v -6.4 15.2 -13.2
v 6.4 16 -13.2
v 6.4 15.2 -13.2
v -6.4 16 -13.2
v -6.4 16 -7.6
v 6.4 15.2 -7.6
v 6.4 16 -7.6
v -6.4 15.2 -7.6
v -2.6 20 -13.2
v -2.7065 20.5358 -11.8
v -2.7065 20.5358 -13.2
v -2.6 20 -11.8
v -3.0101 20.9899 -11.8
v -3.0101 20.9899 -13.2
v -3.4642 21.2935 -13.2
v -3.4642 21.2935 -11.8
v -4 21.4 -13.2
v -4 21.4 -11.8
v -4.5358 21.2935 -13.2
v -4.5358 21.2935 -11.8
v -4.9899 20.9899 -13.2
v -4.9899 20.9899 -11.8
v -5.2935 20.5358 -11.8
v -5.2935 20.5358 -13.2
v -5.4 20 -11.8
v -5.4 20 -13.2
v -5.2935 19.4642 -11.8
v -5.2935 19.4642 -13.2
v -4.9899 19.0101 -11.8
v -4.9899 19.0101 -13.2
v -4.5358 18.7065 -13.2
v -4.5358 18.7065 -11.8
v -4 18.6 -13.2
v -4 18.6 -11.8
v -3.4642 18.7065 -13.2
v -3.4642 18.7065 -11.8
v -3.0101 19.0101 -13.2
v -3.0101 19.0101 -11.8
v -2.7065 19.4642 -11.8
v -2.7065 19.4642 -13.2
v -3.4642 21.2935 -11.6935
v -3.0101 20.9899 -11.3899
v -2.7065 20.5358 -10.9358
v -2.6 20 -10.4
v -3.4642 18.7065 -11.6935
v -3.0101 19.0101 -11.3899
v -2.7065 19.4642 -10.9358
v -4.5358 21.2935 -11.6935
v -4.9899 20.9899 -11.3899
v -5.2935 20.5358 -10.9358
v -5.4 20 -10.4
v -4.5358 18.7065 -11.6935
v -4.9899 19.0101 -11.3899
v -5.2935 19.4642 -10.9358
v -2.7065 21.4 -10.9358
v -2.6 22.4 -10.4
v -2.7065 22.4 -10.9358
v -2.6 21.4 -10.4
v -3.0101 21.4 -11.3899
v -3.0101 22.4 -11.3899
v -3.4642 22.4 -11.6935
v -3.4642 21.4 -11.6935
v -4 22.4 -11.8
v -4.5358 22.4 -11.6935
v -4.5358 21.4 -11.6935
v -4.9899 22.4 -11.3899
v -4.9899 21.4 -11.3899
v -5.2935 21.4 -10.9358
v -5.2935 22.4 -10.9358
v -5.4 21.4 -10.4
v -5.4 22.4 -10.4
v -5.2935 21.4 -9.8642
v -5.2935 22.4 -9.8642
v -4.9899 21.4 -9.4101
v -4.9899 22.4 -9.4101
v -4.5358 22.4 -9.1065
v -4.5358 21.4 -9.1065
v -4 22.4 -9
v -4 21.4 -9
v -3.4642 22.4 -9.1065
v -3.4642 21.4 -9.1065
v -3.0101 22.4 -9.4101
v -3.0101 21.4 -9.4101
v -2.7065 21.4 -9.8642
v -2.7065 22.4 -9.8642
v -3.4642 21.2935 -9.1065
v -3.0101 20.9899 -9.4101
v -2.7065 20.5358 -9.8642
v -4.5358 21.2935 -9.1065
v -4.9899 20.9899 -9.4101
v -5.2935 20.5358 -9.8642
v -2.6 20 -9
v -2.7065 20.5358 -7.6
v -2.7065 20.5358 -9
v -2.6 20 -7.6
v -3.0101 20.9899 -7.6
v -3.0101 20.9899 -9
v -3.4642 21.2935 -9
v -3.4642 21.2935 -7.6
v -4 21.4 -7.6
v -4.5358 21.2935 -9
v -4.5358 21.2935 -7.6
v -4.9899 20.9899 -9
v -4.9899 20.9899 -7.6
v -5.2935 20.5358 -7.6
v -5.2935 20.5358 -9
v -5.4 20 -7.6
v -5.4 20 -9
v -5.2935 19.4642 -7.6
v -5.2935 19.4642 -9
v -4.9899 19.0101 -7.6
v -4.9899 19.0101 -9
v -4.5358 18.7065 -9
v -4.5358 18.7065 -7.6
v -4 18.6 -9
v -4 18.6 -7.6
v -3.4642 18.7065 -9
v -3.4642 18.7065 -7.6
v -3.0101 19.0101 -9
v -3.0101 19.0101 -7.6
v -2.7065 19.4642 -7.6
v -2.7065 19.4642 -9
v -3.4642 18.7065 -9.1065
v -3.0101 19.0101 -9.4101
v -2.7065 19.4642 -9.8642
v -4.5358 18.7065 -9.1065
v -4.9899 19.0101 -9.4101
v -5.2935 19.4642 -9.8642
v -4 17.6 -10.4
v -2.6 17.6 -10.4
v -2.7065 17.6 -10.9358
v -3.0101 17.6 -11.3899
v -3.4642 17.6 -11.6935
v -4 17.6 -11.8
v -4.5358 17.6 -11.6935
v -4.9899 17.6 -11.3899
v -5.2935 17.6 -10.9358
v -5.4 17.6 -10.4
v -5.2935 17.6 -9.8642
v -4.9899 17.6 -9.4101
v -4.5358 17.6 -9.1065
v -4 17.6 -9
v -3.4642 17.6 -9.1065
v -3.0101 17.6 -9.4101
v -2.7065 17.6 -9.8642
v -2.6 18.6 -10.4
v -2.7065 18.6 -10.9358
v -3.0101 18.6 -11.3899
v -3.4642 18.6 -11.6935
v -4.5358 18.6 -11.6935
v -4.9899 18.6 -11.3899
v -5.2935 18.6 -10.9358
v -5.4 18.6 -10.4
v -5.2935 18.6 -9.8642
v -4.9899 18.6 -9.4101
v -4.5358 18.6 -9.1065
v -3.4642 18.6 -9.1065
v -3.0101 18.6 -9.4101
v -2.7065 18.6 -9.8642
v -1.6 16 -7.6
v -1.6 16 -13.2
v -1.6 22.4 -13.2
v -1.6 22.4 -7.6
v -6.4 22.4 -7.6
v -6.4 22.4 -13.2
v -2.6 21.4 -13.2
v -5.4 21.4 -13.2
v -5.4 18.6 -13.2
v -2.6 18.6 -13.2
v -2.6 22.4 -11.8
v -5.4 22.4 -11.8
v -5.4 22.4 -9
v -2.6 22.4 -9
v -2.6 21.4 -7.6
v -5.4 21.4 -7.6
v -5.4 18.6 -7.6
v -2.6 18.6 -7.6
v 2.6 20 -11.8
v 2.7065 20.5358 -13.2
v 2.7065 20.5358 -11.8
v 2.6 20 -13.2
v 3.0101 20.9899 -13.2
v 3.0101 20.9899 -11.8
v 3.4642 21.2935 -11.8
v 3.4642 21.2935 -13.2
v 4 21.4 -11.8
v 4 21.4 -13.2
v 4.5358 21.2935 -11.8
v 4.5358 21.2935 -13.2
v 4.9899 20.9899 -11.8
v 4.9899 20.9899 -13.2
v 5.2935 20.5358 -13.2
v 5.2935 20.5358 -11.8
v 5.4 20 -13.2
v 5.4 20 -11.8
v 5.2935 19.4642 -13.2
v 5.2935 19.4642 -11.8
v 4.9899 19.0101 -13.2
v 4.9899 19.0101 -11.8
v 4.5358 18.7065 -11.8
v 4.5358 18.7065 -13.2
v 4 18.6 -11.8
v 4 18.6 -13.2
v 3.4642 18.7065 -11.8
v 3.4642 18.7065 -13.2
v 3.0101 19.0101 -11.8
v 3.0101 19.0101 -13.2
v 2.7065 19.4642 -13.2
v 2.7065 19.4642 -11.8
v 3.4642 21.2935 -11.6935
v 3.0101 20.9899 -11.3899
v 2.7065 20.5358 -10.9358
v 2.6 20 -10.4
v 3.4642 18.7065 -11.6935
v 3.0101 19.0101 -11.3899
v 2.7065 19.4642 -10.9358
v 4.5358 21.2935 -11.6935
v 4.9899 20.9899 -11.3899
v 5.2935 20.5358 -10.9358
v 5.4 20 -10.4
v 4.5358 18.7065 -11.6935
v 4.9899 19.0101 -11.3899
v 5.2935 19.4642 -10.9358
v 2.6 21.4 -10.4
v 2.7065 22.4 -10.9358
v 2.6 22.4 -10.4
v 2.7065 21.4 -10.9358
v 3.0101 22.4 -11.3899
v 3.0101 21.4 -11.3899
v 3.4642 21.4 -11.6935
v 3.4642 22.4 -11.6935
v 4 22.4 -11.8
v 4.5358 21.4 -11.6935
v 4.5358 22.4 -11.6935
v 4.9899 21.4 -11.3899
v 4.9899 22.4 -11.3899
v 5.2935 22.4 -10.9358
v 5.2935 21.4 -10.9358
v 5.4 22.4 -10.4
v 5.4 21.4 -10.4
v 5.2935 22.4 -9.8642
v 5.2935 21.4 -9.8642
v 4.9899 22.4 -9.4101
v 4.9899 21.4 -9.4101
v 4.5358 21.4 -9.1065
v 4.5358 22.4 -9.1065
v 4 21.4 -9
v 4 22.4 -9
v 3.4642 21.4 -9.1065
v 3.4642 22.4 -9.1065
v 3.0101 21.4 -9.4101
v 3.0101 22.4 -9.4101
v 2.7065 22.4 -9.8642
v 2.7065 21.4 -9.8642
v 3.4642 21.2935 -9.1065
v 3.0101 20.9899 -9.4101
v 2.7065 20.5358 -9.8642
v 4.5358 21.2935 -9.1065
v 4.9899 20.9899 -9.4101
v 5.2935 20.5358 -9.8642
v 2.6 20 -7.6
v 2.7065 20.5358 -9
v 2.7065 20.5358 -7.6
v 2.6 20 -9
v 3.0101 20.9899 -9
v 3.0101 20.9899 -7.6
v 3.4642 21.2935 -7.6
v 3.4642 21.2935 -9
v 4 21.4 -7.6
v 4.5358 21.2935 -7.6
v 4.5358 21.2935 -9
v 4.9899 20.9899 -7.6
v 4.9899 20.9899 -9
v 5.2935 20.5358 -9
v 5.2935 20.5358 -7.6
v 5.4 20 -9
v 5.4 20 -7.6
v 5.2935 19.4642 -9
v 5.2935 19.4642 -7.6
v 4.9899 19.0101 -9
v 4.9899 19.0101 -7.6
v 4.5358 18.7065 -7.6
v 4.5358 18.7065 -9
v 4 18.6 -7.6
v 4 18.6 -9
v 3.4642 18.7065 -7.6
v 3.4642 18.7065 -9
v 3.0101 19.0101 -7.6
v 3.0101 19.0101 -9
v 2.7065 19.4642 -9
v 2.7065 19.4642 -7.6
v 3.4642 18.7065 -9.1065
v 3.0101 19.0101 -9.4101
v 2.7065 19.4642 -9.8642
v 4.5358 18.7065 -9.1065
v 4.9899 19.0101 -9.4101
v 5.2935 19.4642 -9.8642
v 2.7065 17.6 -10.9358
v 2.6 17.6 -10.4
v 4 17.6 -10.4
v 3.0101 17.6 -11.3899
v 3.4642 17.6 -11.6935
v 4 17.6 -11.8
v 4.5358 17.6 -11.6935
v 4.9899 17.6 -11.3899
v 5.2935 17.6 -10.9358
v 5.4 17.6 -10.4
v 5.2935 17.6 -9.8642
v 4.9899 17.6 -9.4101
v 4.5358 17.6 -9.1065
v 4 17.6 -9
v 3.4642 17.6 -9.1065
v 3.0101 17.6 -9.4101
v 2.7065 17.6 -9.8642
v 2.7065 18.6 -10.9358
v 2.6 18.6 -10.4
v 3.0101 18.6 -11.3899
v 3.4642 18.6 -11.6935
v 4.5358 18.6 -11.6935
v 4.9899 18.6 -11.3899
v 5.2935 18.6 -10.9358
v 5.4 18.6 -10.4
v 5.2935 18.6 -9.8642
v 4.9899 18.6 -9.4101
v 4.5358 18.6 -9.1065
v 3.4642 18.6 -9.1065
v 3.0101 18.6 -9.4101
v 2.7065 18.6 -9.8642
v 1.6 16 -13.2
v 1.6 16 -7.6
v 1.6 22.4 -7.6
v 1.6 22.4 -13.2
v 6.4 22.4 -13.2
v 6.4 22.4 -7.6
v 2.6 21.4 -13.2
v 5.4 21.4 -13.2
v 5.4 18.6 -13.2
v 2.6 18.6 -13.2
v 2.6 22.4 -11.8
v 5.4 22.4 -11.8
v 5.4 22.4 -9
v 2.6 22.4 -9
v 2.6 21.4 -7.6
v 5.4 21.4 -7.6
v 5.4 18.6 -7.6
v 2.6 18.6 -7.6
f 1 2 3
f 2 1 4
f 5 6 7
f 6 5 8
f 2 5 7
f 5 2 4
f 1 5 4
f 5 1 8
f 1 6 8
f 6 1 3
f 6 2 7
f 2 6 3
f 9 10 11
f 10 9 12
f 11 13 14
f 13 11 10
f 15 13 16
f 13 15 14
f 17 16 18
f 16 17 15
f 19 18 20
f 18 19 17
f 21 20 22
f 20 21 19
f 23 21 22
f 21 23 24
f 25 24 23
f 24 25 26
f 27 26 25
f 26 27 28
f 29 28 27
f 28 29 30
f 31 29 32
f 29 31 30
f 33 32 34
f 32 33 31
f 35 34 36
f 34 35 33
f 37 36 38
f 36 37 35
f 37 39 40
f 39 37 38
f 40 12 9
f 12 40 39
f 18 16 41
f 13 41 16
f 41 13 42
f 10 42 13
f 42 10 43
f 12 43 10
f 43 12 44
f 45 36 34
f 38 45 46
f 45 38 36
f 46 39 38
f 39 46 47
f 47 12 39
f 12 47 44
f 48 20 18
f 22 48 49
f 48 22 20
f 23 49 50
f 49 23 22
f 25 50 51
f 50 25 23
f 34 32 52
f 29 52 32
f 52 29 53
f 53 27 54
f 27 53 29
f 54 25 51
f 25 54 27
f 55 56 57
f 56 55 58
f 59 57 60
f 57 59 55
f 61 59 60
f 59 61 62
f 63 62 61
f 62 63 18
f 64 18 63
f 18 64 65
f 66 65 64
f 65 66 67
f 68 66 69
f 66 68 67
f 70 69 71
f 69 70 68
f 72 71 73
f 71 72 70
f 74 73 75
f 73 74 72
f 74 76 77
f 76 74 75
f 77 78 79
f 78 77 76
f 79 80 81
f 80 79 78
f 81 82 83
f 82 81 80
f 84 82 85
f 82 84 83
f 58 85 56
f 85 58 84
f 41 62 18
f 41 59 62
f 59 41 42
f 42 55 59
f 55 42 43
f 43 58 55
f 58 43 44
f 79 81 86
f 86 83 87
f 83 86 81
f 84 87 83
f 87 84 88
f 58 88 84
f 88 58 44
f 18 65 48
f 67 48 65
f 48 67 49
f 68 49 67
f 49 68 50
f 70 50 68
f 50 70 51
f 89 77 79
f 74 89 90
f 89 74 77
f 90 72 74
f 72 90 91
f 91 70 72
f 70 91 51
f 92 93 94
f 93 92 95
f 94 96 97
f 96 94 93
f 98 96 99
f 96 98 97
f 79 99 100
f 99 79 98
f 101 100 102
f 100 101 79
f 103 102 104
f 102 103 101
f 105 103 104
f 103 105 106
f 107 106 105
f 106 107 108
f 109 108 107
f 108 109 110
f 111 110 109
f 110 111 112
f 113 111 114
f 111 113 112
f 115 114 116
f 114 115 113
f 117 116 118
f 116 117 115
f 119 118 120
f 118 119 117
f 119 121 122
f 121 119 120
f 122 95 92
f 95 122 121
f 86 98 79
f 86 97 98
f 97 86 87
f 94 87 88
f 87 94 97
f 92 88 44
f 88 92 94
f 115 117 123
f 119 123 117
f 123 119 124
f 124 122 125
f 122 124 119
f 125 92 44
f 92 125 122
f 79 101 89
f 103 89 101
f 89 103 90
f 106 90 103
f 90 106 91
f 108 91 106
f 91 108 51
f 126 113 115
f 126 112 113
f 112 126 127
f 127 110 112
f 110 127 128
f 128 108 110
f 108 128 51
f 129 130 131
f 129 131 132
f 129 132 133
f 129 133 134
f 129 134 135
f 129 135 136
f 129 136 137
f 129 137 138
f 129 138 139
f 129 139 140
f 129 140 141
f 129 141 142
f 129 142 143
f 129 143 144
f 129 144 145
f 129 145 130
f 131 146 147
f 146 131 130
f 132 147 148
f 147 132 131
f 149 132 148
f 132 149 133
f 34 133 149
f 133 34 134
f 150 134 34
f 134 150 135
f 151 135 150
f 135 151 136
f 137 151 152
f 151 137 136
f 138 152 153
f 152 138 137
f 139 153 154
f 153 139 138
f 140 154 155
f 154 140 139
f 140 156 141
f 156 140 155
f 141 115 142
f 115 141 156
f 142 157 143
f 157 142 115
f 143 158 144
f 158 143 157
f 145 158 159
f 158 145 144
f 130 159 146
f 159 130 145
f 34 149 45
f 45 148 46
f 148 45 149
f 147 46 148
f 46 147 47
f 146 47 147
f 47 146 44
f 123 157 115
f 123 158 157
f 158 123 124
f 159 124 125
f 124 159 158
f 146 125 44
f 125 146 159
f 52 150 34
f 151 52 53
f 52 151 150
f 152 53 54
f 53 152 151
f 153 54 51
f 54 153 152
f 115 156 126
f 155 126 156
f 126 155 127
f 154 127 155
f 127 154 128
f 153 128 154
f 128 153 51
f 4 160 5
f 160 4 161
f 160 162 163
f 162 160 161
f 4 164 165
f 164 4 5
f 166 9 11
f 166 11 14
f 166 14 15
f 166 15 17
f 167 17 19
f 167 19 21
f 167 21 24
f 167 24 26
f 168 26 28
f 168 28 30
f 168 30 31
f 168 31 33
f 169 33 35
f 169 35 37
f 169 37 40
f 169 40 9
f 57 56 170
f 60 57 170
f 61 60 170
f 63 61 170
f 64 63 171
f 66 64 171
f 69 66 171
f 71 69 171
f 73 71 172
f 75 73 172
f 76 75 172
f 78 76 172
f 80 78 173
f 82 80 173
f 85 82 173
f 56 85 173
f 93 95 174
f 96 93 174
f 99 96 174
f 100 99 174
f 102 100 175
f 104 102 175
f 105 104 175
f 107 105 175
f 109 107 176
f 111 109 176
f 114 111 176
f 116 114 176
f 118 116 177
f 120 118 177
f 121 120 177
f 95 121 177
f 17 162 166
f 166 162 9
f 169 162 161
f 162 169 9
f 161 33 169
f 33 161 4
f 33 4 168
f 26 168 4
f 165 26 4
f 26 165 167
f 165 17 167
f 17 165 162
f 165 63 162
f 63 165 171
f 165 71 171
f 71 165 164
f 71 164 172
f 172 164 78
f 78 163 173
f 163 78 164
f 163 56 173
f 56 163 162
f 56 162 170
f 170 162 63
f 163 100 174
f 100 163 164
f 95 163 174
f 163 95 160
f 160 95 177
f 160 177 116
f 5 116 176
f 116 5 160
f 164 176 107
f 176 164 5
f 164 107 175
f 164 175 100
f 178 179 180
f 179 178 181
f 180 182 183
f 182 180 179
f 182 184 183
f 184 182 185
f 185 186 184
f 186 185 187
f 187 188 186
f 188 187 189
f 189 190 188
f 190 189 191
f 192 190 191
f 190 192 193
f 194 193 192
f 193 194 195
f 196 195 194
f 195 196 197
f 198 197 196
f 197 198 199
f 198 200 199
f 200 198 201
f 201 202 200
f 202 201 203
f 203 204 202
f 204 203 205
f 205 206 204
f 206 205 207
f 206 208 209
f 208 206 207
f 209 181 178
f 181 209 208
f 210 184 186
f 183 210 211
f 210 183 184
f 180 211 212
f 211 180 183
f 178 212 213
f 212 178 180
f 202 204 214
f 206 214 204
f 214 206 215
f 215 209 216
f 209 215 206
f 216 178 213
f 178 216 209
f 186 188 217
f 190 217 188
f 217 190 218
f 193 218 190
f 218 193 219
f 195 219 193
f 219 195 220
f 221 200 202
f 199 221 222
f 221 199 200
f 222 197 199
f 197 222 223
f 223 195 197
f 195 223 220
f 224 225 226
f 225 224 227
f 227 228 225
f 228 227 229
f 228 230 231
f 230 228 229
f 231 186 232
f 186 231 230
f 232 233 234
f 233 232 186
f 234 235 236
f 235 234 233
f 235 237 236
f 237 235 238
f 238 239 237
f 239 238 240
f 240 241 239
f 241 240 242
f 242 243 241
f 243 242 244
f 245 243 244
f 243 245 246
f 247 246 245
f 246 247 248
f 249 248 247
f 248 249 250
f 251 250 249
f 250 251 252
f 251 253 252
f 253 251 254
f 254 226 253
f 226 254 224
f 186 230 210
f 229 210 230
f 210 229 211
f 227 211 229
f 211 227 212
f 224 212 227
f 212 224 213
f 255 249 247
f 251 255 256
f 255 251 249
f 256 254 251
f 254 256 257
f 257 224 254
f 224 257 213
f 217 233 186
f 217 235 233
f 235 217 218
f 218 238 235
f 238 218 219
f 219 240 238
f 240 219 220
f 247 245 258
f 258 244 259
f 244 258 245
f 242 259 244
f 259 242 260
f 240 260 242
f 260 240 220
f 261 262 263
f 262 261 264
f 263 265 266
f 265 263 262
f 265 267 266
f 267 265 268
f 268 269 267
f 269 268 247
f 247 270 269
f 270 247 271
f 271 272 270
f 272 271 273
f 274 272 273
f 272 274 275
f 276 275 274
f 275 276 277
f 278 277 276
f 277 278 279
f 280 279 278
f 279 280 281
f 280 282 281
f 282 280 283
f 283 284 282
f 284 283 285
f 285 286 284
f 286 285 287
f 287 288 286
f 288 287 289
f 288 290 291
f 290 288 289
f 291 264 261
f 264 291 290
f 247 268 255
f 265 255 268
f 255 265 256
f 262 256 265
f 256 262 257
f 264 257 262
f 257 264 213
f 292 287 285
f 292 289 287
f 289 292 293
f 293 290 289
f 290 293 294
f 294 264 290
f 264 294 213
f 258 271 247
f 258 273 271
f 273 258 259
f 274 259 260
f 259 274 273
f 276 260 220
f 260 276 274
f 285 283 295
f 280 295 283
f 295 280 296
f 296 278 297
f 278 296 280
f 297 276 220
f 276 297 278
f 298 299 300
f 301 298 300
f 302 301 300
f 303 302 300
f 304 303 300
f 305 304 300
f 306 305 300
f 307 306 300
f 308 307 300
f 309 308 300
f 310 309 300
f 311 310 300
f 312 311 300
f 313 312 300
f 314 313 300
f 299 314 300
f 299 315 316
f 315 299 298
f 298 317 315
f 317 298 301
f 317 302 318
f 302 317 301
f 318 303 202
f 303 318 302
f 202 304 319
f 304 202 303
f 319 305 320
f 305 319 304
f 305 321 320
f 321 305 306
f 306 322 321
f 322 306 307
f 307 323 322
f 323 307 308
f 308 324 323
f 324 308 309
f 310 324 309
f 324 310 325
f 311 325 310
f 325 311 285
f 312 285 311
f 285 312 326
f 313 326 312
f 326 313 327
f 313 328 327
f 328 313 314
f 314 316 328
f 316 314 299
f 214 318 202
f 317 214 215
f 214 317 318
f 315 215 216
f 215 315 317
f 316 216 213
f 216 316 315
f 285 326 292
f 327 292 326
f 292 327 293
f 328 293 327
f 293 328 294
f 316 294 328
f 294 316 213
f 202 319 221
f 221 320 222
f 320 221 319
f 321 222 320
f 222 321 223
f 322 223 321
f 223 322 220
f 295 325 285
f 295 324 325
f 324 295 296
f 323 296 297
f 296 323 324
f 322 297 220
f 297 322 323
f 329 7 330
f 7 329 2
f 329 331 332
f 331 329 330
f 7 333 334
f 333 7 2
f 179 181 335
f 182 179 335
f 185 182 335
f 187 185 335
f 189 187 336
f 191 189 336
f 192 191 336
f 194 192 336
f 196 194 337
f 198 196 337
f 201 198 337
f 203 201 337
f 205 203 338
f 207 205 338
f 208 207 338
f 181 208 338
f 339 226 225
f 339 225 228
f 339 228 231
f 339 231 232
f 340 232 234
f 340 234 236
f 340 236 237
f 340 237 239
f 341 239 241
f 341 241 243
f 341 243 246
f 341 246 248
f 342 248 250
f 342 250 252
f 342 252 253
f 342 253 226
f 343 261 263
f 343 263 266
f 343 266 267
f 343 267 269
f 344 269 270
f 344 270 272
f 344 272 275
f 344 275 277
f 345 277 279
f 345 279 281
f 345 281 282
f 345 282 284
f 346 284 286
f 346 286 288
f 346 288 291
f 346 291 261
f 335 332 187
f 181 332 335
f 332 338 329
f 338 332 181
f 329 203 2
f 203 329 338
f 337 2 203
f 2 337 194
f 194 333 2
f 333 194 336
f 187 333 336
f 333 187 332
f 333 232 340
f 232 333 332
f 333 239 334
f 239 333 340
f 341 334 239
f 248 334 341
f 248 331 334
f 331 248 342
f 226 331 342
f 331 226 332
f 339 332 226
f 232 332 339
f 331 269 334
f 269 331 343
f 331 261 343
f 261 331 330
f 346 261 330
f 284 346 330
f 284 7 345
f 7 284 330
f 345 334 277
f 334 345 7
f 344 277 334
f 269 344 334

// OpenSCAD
// file: ../p/box3u2p.scad
use <../lib.scad>
function ldraw_lib__box3u2p() = [
// 0 Box with 3 Faces without 2 Parallel Edges
// 0 Name: box3u2p.dat
// 0 Author: Niels Karsdorp [nielsk]
// 0 !LDRAW_ORG Primitive UPDATE 2012-01
// 0 !LICENSE Licensed under CC BY 4.0 : see CAreadme.txt
// 
// 0 BFC CERTIFY CCW
  [0,"BFC","CERTIFY"],
  [0,"BFC","CCW"],
// 
// 0 !HISTORY 2003-03-12 [PTadmin] Official Update 2003-01
// 0 !HISTORY 2007-06-24 [PTadmin] Header formatted for Contributor Agreement
// 0 !HISTORY 2008-07-01 [PTadmin] Official Update 2008-01
// 0 !HISTORY 2012-02-16 [Philo] Changed to CCW
// 0 !HISTORY 2012-03-30 [PTadmin] Official Update 2012-01
// 
// 
// 2 24 1 1 1 -1 1 1
  [2,24,1,1,1,-1,1,1],
// 2 24 -1 1 -1 1 1 -1
  [2,24,-1,1,-1,1,1,-1],
// 2 24 1 0 1 -1 0 1
  [2,24,1,0,1,-1,0,1],
// 2 24 -1 0 -1 1 0 -1
  [2,24,-1,0,-1,1,0,-1],
// 2 24 1 1 1 1 1 -1
  [2,24,1,1,1,1,1,-1],
// 2 24 -1 1 1 -1 1 -1
  [2,24,-1,1,1,-1,1,-1],
// 2 24 1 1 1 1 0 1
  [2,24,1,1,1,1,0,1],
// 2 24 1 1 -1 1 0 -1
  [2,24,1,1,-1,1,0,-1],
// 2 24 -1 1 1 -1 0 1
  [2,24,-1,1,1,-1,0,1],
// 2 24 -1 1 -1 -1 0 -1
  [2,24,-1,1,-1,-1,0,-1],
// 4 16 -1 1 -1 -1 1 1 1 1 1 1 1 -1
  [4,16,-1,1,-1,-1,1,1,1,1,1,1,1,-1],
// 4 16 -1 1 1 -1 0 1 1 0 1 1 1 1
  [4,16,-1,1,1,-1,0,1,1,0,1,1,1,1],
// 4 16 1 1 -1 1 0 -1 -1 0 -1 -1 1 -1
  [4,16,1,1,-1,1,0,-1,-1,0,-1,-1,1,-1],
];
module ldraw_lib__box3u2p(step=0, col=false, unit=2/5, alt=false, line=0.2, solid=!$preview)
    makepoly(ldraw_lib__box3u2p(), step=step, col=col, unit=unit, alt=alt, line=line, solid=solid);
ldraw_lib__box3u2p(line=0.2);
// file: ../p/4-4ndis.scad
use <../lib.scad>
function ldraw_lib__4_4ndis() = [
// 0 Disc Negative 1.0
// 0 Name: 4-4ndis.dat
// 0 Author: James Jessiman
// 0 !LDRAW_ORG Primitive UPDATE 2012-01
// 0 !LICENSE Licensed under CC BY 4.0 : see CAreadme.txt
// 
// 0 BFC CERTIFY CCW
  [0,"BFC","CERTIFY"],
  [0,"BFC","CCW"],
// 
// 0 !HISTORY 2002-03-23 [sbliss] Added BFC statement; compacted code
// 0 !HISTORY 2002-04-25 [PTadmin] Official Update 2002-02
// 0 !HISTORY 2007-06-24 [PTadmin] Header formatted for Contributor Agreement
// 0 !HISTORY 2008-07-01 [PTadmin] Official Update 2008-01
// 0 !HISTORY 2012-02-16 [Philo] Changed to CCW
// 0 !HISTORY 2012-03-30 [PTadmin] Official Update 2012-01
// 
// 
// 3 16 0.9239 0 0.3827 1 0 0 1 0 1
  [3,16,0.9239,0,0.3827,1,0,0,1,0,1],
// 3 16 0.7071 0 0.7071 0.9239 0 0.3827 1 0 1
  [3,16,0.7071,0,0.7071,0.9239,0,0.3827,1,0,1],
// 3 16 0.3827 0 0.9239 0.7071 0 0.7071 1 0 1
  [3,16,0.3827,0,0.9239,0.7071,0,0.7071,1,0,1],
// 3 16 0 0 1 0.3827 0 0.9239 1 0 1
  [3,16,0,0,1,0.3827,0,0.9239,1,0,1],
// 3 16 -0.3827 0 0.9239 0 0 1 -1 0 1
  [3,16,-0.3827,0,0.9239,0,0,1,-1,0,1],
// 3 16 -0.7071 0 0.7071 -0.3827 0 0.9239 -1 0 1
  [3,16,-0.7071,0,0.7071,-0.3827,0,0.9239,-1,0,1],
// 3 16 -0.9239 0 0.3827 -0.7071 0 0.7071 -1 0 1
  [3,16,-0.9239,0,0.3827,-0.7071,0,0.7071,-1,0,1],
// 3 16 -1 0 0 -0.9239 0 0.3827 -1 0 1
  [3,16,-1,0,0,-0.9239,0,0.3827,-1,0,1],
// 3 16 -0.9239 0 -0.3827 -1 0 0 -1 0 -1
  [3,16,-0.9239,0,-0.3827,-1,0,0,-1,0,-1],
// 3 16 -0.7071 0 -0.7071 -0.9239 0 -0.3827 -1 0 -1
  [3,16,-0.7071,0,-0.7071,-0.9239,0,-0.3827,-1,0,-1],
// 3 16 -0.3827 0 -0.9239 -0.7071 0 -0.7071 -1 0 -1
  [3,16,-0.3827,0,-0.9239,-0.7071,0,-0.7071,-1,0,-1],
// 3 16 0 0 -1 -0.3827 0 -0.9239 -1 0 -1
  [3,16,0,0,-1,-0.3827,0,-0.9239,-1,0,-1],
// 3 16 0.3827 0 -0.9239 0 0 -1 1 0 -1
  [3,16,0.3827,0,-0.9239,0,0,-1,1,0,-1],
// 3 16 0.7071 0 -0.7071 0.3827 0 -0.9239 1 0 -1
  [3,16,0.7071,0,-0.7071,0.3827,0,-0.9239,1,0,-1],
// 3 16 0.9239 0 -0.3827 0.7071 0 -0.7071 1 0 -1
  [3,16,0.9239,0,-0.3827,0.7071,0,-0.7071,1,0,-1],
// 3 16 1 0 0 0.9239 0 -0.3827 1 0 -1
  [3,16,1,0,0,0.9239,0,-0.3827,1,0,-1],
];
module ldraw_lib__4_4ndis(step=0, col=false, unit=2/5, alt=false, line=0.2, solid=!$preview)
    makepoly(ldraw_lib__4_4ndis(), step=step, col=col, unit=unit, alt=alt, line=line, solid=solid);
ldraw_lib__4_4ndis(line=0.2);
// file: ../p/4-4edge.scad
use <../lib.scad>
function ldraw_lib__4_4edge() = [
// 0 Circle 1.0
// 0 Name: 4-4edge.dat
// 0 Author: James Jessiman
// 0 !LDRAW_ORG Primitive UPDATE 2017-01
// 0 !LICENSE Licensed under CC BY 4.0 : see CAreadme.txt
// 
// 0 BFC CERTIFY CCW
  [0,"BFC","CERTIFY"],
  [0,"BFC","CCW"],
// 
// 0 !HISTORY 1998-12-15 [PTadmin] Official Update 1998-10
// 0 !HISTORY 2005-12-28 [PTadmin] Official Update 2005-01
// 0 !HISTORY 2007-06-24 [PTadmin] Header formatted for Contributor Agreement
// 0 !HISTORY 2008-07-01 [PTadmin] Official Update 2008-01
// 0 !HISTORY 2017-01-15 [Steffen] BFCed
// 0 !HISTORY 2017-12-30 [PTadmin] Official Update 2017-01
// 
// 
// 2 24 1 0 0 0.9239 0 0.3827
  [2,24,1,0,0,0.9239,0,0.3827],
// 2 24 0.9239 0 0.3827 0.7071 0 0.7071
  [2,24,0.9239,0,0.3827,0.7071,0,0.7071],
// 2 24 0.7071 0 0.7071 0.3827 0 0.9239
  [2,24,0.7071,0,0.7071,0.3827,0,0.9239],
// 2 24 0.3827 0 0.9239 0 0 1
  [2,24,0.3827,0,0.9239,0,0,1],
// 2 24 0 0 1 -0.3827 0 0.9239
  [2,24,0,0,1,-0.3827,0,0.9239],
// 2 24 -0.3827 0 0.9239 -0.7071 0 0.7071
  [2,24,-0.3827,0,0.9239,-0.7071,0,0.7071],
// 2 24 -0.7071 0 0.7071 -0.9239 0 0.3827
  [2,24,-0.7071,0,0.7071,-0.9239,0,0.3827],
// 2 24 -0.9239 0 0.3827 -1 0 -0
  [2,24,-0.9239,0,0.3827,-1,0,-0],
// 2 24 -1 0 -0 -0.9239 0 -0.3827
  [2,24,-1,0,-0,-0.9239,0,-0.3827],
// 2 24 -0.9239 0 -0.3827 -0.7071 0 -0.7071
  [2,24,-0.9239,0,-0.3827,-0.7071,0,-0.7071],
// 2 24 -0.7071 0 -0.7071 -0.3827 0 -0.9239
  [2,24,-0.7071,0,-0.7071,-0.3827,0,-0.9239],
// 2 24 -0.3827 0 -0.9239 0 0 -1
  [2,24,-0.3827,0,-0.9239,0,0,-1],
// 2 24 0 0 -1 0.3827 0 -0.9239
  [2,24,0,0,-1,0.3827,0,-0.9239],
// 2 24 0.3827 0 -0.9239 0.7071 0 -0.7071
  [2,24,0.3827,0,-0.9239,0.7071,0,-0.7071],
// 2 24 0.7071 0 -0.7071 0.9239 0 -0.3827
  [2,24,0.7071,0,-0.7071,0.9239,0,-0.3827],
// 2 24 0.9239 0 -0.3827 1 0 0
  [2,24,0.9239,0,-0.3827,1,0,0],
];
module ldraw_lib__4_4edge(step=0, col=false, unit=2/5, alt=false, line=0.2, solid=!$preview)
    makepoly(ldraw_lib__4_4edge(), step=step, col=col, unit=unit, alt=alt, line=line, solid=solid);
ldraw_lib__4_4edge(line=0.2);
// file: ../p/4-4disc.scad
use <../lib.scad>
function ldraw_lib__4_4disc() = [
// 0 Disc 1.0
// 0 Name: 4-4disc.dat
// 0 Author: James Jessiman
// 0 !LDRAW_ORG Primitive UPDATE 2002-02
// 0 !LICENSE Licensed under CC BY 4.0 : see CAreadme.txt
// 
// 0 BFC CERTIFY CCW
  [0,"BFC","CERTIFY"],
  [0,"BFC","CCW"],
// 
// 0 !HISTORY 1998-12-15 [PTadmin] Official Update 1998-10
// 0 !HISTORY 2002-03-23 [sbliss] Added BFC statement
// 0 !HISTORY 2002-04-25 [PTadmin] Official Update 2002-02
// 0 !HISTORY 2007-06-24 [PTadmin] Header formatted for Contributor Agreement
// 0 !HISTORY 2008-07-01 [PTadmin] Official Update 2008-01
// 
// 
// 3 16 0 0 0 1 0 0 0.9239 0 0.3827
  [3,16,0,0,0,1,0,0,0.9239,0,0.3827],
// 3 16 0 0 0 0.9239 0 0.3827 0.7071 0 0.7071
  [3,16,0,0,0,0.9239,0,0.3827,0.7071,0,0.7071],
// 3 16 0 0 0 0.7071 0 0.7071 0.3827 0 0.9239
  [3,16,0,0,0,0.7071,0,0.7071,0.3827,0,0.9239],
// 3 16 0 0 0 0.3827 0 0.9239 0 0 1
  [3,16,0,0,0,0.3827,0,0.9239,0,0,1],
// 3 16 0 0 0 0 0 1 -0.3827 0 0.9239
  [3,16,0,0,0,0,0,1,-0.3827,0,0.9239],
// 3 16 0 0 0 -0.3827 0 0.9239 -0.7071 0 0.7071
  [3,16,0,0,0,-0.3827,0,0.9239,-0.7071,0,0.7071],
// 3 16 0 0 0 -0.7071 0 0.7071 -0.9239 0 0.3827
  [3,16,0,0,0,-0.7071,0,0.7071,-0.9239,0,0.3827],
// 3 16 0 0 0 -0.9239 0 0.3827 -1 0 -0
  [3,16,0,0,0,-0.9239,0,0.3827,-1,0,-0],
// 3 16 0 0 0 -1 0 -0 -0.9239 0 -0.3827
  [3,16,0,0,0,-1,0,-0,-0.9239,0,-0.3827],
// 3 16 0 0 0 -0.9239 0 -0.3827 -0.7071 0 -0.7071
  [3,16,0,0,0,-0.9239,0,-0.3827,-0.7071,0,-0.7071],
// 3 16 0 0 0 -0.7071 0 -0.7071 -0.3827 0 -0.9239
  [3,16,0,0,0,-0.7071,0,-0.7071,-0.3827,0,-0.9239],
// 3 16 0 0 0 -0.3827 0 -0.9239 0 0 -1
  [3,16,0,0,0,-0.3827,0,-0.9239,0,0,-1],
// 3 16 0 0 0 0 0 -1 0.3827 0 -0.9239
  [3,16,0,0,0,0,0,-1,0.3827,0,-0.9239],
// 3 16 0 0 0 0.3827 0 -0.9239 0.7071 0 -0.7071
  [3,16,0,0,0,0.3827,0,-0.9239,0.7071,0,-0.7071],
// 3 16 0 0 0 0.7071 0 -0.7071 0.9239 0 -0.3827
  [3,16,0,0,0,0.7071,0,-0.7071,0.9239,0,-0.3827],
// 3 16 0 0 0 0.9239 0 -0.3827 1 0 0
  [3,16,0,0,0,0.9239,0,-0.3827,1,0,0],
// 0
];
module ldraw_lib__4_4disc(step=0, col=false, unit=2/5, alt=false, line=0.2, solid=!$preview)
    makepoly(ldraw_lib__4_4disc(), step=step, col=col, unit=unit, alt=alt, line=line, solid=solid);
ldraw_lib__4_4disc(line=0.2);
// file: ../p/4-4cyli.scad
use <../lib.scad>
function ldraw_lib__4_4cyli() = [
// 0 Cylinder 1.0
// 0 Name: 4-4cyli.dat
// 0 Author: James Jessiman
// 0 !LDRAW_ORG Primitive UPDATE 2005-01
// 0 !LICENSE Licensed under CC BY 4.0 : see CAreadme.txt
// 
// 0 BFC CERTIFY CCW
  [0,"BFC","CERTIFY"],
  [0,"BFC","CCW"],
// 
// 0 !HISTORY 1998-12-15 [PTadmin] Official Update 1998-10
// 0 !HISTORY 2002-03-23 [sbliss] Added BFC statement; merged headers from files in distributions LDraw 0.27 and Complete.
// 0 !HISTORY 2002-04-25 [PTadmin] Official Update 2002-02
// 0 !HISTORY 2004-12-14 [guyvivan] BFC CCW
// 0 !HISTORY 2005-12-28 [PTadmin] Official Update 2005-01
// 0 !HISTORY 2007-06-24 [PTadmin] Header formatted for Contributor Agreement
// 0 !HISTORY 2008-07-01 [PTadmin] Official Update 2008-01
// 
// 
// 4 16 1 1 0 0.9239 1 0.3827 0.9239 0 0.3827 1 0 0
  [4,16,1,1,0,0.9239,1,0.3827,0.9239,0,0.3827,1,0,0],
// 5 24 1 0 0 1 1 0 0.9239 0 0.3827 0.9239 0 -0.3827
  [5,24,1,0,0,1,1,0,0.9239,0,0.3827,0.9239,0,-0.3827],
// 4 16 0.9239 1 0.3827 0.7071 1 0.7071 0.7071 0 0.7071 0.9239 0 0.3827
  [4,16,0.9239,1,0.3827,0.7071,1,0.7071,0.7071,0,0.7071,0.9239,0,0.3827],
// 5 24 0.9239 0 0.3827 0.9239 1 0.3827 0.7071 0 0.7071 1 0 0
  [5,24,0.9239,0,0.3827,0.9239,1,0.3827,0.7071,0,0.7071,1,0,0],
// 4 16 0.7071 1 0.7071 0.3827 1 0.9239 0.3827 0 0.9239 0.7071 0 0.7071
  [4,16,0.7071,1,0.7071,0.3827,1,0.9239,0.3827,0,0.9239,0.7071,0,0.7071],
// 5 24 0.7071 0 0.7071 0.7071 1 0.7071 0.3827 0 0.9239 0.9239 0 0.3827
  [5,24,0.7071,0,0.7071,0.7071,1,0.7071,0.3827,0,0.9239,0.9239,0,0.3827],
// 4 16 0.3827 1 0.9239 0 1 1 0 0 1 0.3827 0 0.9239
  [4,16,0.3827,1,0.9239,0,1,1,0,0,1,0.3827,0,0.9239],
// 5 24 0.3827 0 0.9239 0.3827 1 0.9239 0 0 1 0.7071 0 0.7071
  [5,24,0.3827,0,0.9239,0.3827,1,0.9239,0,0,1,0.7071,0,0.7071],
// 4 16 0 1 1 -0.3827 1 0.9239 -0.3827 0 0.9239 0 0 1
  [4,16,0,1,1,-0.3827,1,0.9239,-0.3827,0,0.9239,0,0,1],
// 5 24 0 0 1 0 1 1 -0.3827 0 0.9239 0.3827 0 0.9239
  [5,24,0,0,1,0,1,1,-0.3827,0,0.9239,0.3827,0,0.9239],
// 4 16 -0.3827 1 0.9239 -0.7071 1 0.7071 -0.7071 0 0.7071 -0.3827 0 0.9239
  [4,16,-0.3827,1,0.9239,-0.7071,1,0.7071,-0.7071,0,0.7071,-0.3827,0,0.9239],
// 5 24 -0.3827 0 0.9239 -0.3827 1 0.9239 -0.7071 0 0.7071 0 0 1
  [5,24,-0.3827,0,0.9239,-0.3827,1,0.9239,-0.7071,0,0.7071,0,0,1],
// 4 16 -0.7071 1 0.7071 -0.9239 1 0.3827 -0.9239 0 0.3827 -0.7071 0 0.7071
  [4,16,-0.7071,1,0.7071,-0.9239,1,0.3827,-0.9239,0,0.3827,-0.7071,0,0.7071],
// 5 24 -0.7071 0 0.7071 -0.7071 1 0.7071 -0.9239 0 0.3827 -0.3827 0 0.9239
  [5,24,-0.7071,0,0.7071,-0.7071,1,0.7071,-0.9239,0,0.3827,-0.3827,0,0.9239],
// 4 16 -0.9239 1 0.3827 -1 1 0 -1 0 0 -0.9239 0 0.3827
  [4,16,-0.9239,1,0.3827,-1,1,0,-1,0,0,-0.9239,0,0.3827],
// 5 24 -0.9239 0 0.3827 -0.9239 1 0.3827 -1 0 0 -0.7071 0 0.7071
  [5,24,-0.9239,0,0.3827,-0.9239,1,0.3827,-1,0,0,-0.7071,0,0.7071],
// 4 16 -1 1 0 -0.9239 1 -0.3827 -0.9239 0 -0.3827 -1 0 0
  [4,16,-1,1,0,-0.9239,1,-0.3827,-0.9239,0,-0.3827,-1,0,0],
// 5 24 -1 0 0 -1 1 0 -0.9239 0 -0.3827 -0.9239 0 0.3827
  [5,24,-1,0,0,-1,1,0,-0.9239,0,-0.3827,-0.9239,0,0.3827],
// 4 16 -0.9239 1 -0.3827 -0.7071 1 -0.7071 -0.7071 0 -0.7071 -0.9239 0 -0.3827
  [4,16,-0.9239,1,-0.3827,-0.7071,1,-0.7071,-0.7071,0,-0.7071,-0.9239,0,-0.3827],
// 5 24 -0.9239 0 -0.3827 -0.9239 1 -0.3827 -0.7071 0 -0.7071 -1 0 0
  [5,24,-0.9239,0,-0.3827,-0.9239,1,-0.3827,-0.7071,0,-0.7071,-1,0,0],
// 4 16 -0.7071 1 -0.7071 -0.3827 1 -0.9239 -0.3827 0 -0.9239 -0.7071 0 -0.7071
  [4,16,-0.7071,1,-0.7071,-0.3827,1,-0.9239,-0.3827,0,-0.9239,-0.7071,0,-0.7071],
// 5 24 -0.7071 0 -0.7071 -0.7071 1 -0.7071 -0.3827 0 -0.9239 -0.9239 0 -0.3827
  [5,24,-0.7071,0,-0.7071,-0.7071,1,-0.7071,-0.3827,0,-0.9239,-0.9239,0,-0.3827],
// 4 16 -0.3827 1 -0.9239 0 1 -1 0 0 -1 -0.3827 0 -0.9239
  [4,16,-0.3827,1,-0.9239,0,1,-1,0,0,-1,-0.3827,0,-0.9239],
// 5 24 -0.3827 0 -0.9239 -0.3827 1 -0.9239 0 0 -1 -0.7071 0 -0.7071
  [5,24,-0.3827,0,-0.9239,-0.3827,1,-0.9239,0,0,-1,-0.7071,0,-0.7071],
// 4 16 0 1 -1 0.3827 1 -0.9239 0.3827 0 -0.9239 0 0 -1
  [4,16,0,1,-1,0.3827,1,-0.9239,0.3827,0,-0.9239,0,0,-1],
// 5 24 0 0 -1 0 1 -1 0.3827 0 -0.9239 -0.3827 0 -0.9239
  [5,24,0,0,-1,0,1,-1,0.3827,0,-0.9239,-0.3827,0,-0.9239],
// 4 16 0.3827 1 -0.9239 0.7071 1 -0.7071 0.7071 0 -0.7071 0.3827 0 -0.9239
  [4,16,0.3827,1,-0.9239,0.7071,1,-0.7071,0.7071,0,-0.7071,0.3827,0,-0.9239],
// 5 24 0.3827 0 -0.9239 0.3827 1 -0.9239 0.7071 0 -0.7071 0 0 -1
  [5,24,0.3827,0,-0.9239,0.3827,1,-0.9239,0.7071,0,-0.7071,0,0,-1],
// 4 16 0.7071 1 -0.7071 0.9239 1 -0.3827 0.9239 0 -0.3827 0.7071 0 -0.7071
  [4,16,0.7071,1,-0.7071,0.9239,1,-0.3827,0.9239,0,-0.3827,0.7071,0,-0.7071],
// 5 24 0.7071 0 -0.7071 0.7071 1 -0.7071 0.9239 0 -0.3827 0.3827 0 -0.9239
  [5,24,0.7071,0,-0.7071,0.7071,1,-0.7071,0.9239,0,-0.3827,0.3827,0,-0.9239],
// 4 16 0.9239 1 -0.3827 1 1 0 1 0 0 0.9239 0 -0.3827
  [4,16,0.9239,1,-0.3827,1,1,0,1,0,0,0.9239,0,-0.3827],
// 5 24 0.9239 0 -0.3827 0.9239 1 -0.3827 1 0 0 0.7071 0 -0.7071
  [5,24,0.9239,0,-0.3827,0.9239,1,-0.3827,1,0,0,0.7071,0,-0.7071],
// 0
];
module ldraw_lib__4_4cyli(step=0, col=false, unit=2/5, alt=false, line=0.2, solid=!$preview)
    makepoly(ldraw_lib__4_4cyli(), step=step, col=col, unit=unit, alt=alt, line=line, solid=solid);
ldraw_lib__4_4cyli(line=0.2);
// file: ../p/1-4cyls.scad
use <../lib.scad>
function ldraw_lib__1_4cyls() = [
// 0 Cylinder Sloped 0.25
// 0 Name: 1-4cyls.dat
// 0 Author: James Jessiman
// 0 !LDRAW_ORG Primitive UPDATE 2012-01
// 0 !LICENSE Licensed under CC BY 4.0 : see CAreadme.txt
// 
// 0 BFC CERTIFY CCW
  [0,"BFC","CERTIFY"],
  [0,"BFC","CCW"],
// 
// 0 !HISTORY 1998-12-15 [PTadmin] Official Update 1998-10
// 0 !HISTORY 2002-07-03 [sbliss] Added BFC statement
// 0 !HISTORY 2002-08-18 [PTadmin] Official Update 2002-04
// 0 !HISTORY 2007-06-22 [PTadmin] Header formatted for Contributor Agreement
// 0 !HISTORY 2008-07-01 [PTadmin] Official Update 2008-01
// 0 !HISTORY 2012-02-16 [Philo] Changed to CCW
// 0 !HISTORY 2012-03-30 [PTadmin] Official Update 2012-01
// 
// 
// 3 16 0.9239 0.0761 0.3827 0.9239 0 0.3827 1 0 0
  [3,16,0.9239,0.0761,0.3827,0.9239,0,0.3827,1,0,0],
// 4 16 0.9239 0.0761 0.3827 0.7071 0.2929 0.7071 0.7071 0 0.7071 0.9239 0 0.3827
  [4,16,0.9239,0.0761,0.3827,0.7071,0.2929,0.7071,0.7071,0,0.7071,0.9239,0,0.3827],
// 4 16 0.7071 0.2929 0.7071 0.3827 0.6173 0.9239 0.3827 0 0.9239 0.7071 0 0.7071
  [4,16,0.7071,0.2929,0.7071,0.3827,0.6173,0.9239,0.3827,0,0.9239,0.7071,0,0.7071],
// 4 16 0.3827 0.6173 0.9239 0 1 1 0 0 1 0.3827 0 0.9239
  [4,16,0.3827,0.6173,0.9239,0,1,1,0,0,1,0.3827,0,0.9239],
// 
// 5 24 0.9239 0 0.3827 0.9239 0.0761 0.3827 0.7071 0 0.7071 1 0 0
  [5,24,0.9239,0,0.3827,0.9239,0.0761,0.3827,0.7071,0,0.7071,1,0,0],
// 5 24 0.7071 0 0.7071 0.7071 0.2929 0.7071 0.3827 0 0.9239 0.9239 0 0.3827
  [5,24,0.7071,0,0.7071,0.7071,0.2929,0.7071,0.3827,0,0.9239,0.9239,0,0.3827],
// 5 24 0.3827 0 0.9239 0.3827 0.6173 0.9239 0 0 1 0.7071 0 0.7071
  [5,24,0.3827,0,0.9239,0.3827,0.6173,0.9239,0,0,1,0.7071,0,0.7071],
// 5 24 0 0 1 0 1 1 0.3827 0 0.9239 -1 0 1
  [5,24,0,0,1,0,1,1,0.3827,0,0.9239,-1,0,1],
];
module ldraw_lib__1_4cyls(step=0, col=false, unit=2/5, alt=false, line=0.2, solid=!$preview)
    makepoly(ldraw_lib__1_4cyls(), step=step, col=col, unit=unit, alt=alt, line=line, solid=solid);
ldraw_lib__1_4cyls(line=0.2);
// file: ../p/box.scad
use <../lib.scad>
function ldraw_lib__box() = [
// 0 Box 6 (six faces)
// 0 Name: box.dat
// 0 Author: James Jessiman
// 0 !LDRAW_ORG Primitive UPDATE 2002-05
// 0 !LICENSE Licensed under CC BY 4.0 : see CAreadme.txt
// 
// 0 BFC CERTIFY CCW
  [0,"BFC","CERTIFY"],
  [0,"BFC","CCW"],
// 
// 0 !HISTORY 2002-08-22 [sbliss] Applied BFC
// 0 !HISTORY 2002-11-30 [PTadmin] Official Update 2002-05
// 0 !HISTORY 2007-06-24 [PTadmin] Header formatted for Contributor Agreement
// 0 !HISTORY 2008-07-01 [PTadmin] Official Update 2008-01
// 
// 
// 2 24 1 1 1 -1 1 1
  [2,24,1,1,1,-1,1,1],
// 2 24 -1 1 1 -1 1 -1
  [2,24,-1,1,1,-1,1,-1],
// 2 24 -1 1 -1 1 1 -1
  [2,24,-1,1,-1,1,1,-1],
// 2 24 1 1 -1 1 1 1
  [2,24,1,1,-1,1,1,1],
// 2 24 1 -1 1 -1 -1 1
  [2,24,1,-1,1,-1,-1,1],
// 2 24 -1 -1 1 -1 -1 -1
  [2,24,-1,-1,1,-1,-1,-1],
// 2 24 -1 -1 -1 1 -1 -1
  [2,24,-1,-1,-1,1,-1,-1],
// 2 24 1 -1 -1 1 -1 1
  [2,24,1,-1,-1,1,-1,1],
// 2 24 1 -1 1 1 1 1
  [2,24,1,-1,1,1,1,1],
// 2 24 -1 -1 1 -1 1 1
  [2,24,-1,-1,1,-1,1,1],
// 2 24 1 -1 -1 1 1 -1
  [2,24,1,-1,-1,1,1,-1],
// 2 24 -1 -1 -1 -1 1 -1
  [2,24,-1,-1,-1,-1,1,-1],
// 4 16 1 1 1 1 1 -1 -1 1 -1 -1 1 1
  [4,16,1,1,1,1,1,-1,-1,1,-1,-1,1,1],
// 4 16 -1 -1 -1 1 -1 -1 1 -1 1 -1 -1 1
  [4,16,-1,-1,-1,1,-1,-1,1,-1,1,-1,-1,1],
// 4 16 -1 -1 1 1 -1 1 1 1 1 -1 1 1
  [4,16,-1,-1,1,1,-1,1,1,1,1,-1,1,1],
// 4 16 -1 -1 -1 -1 -1 1 -1 1 1 -1 1 -1
  [4,16,-1,-1,-1,-1,-1,1,-1,1,1,-1,1,-1],
// 4 16 1 -1 -1 -1 -1 -1 -1 1 -1 1 1 -1
  [4,16,1,-1,-1,-1,-1,-1,-1,1,-1,1,1,-1],
// 4 16 1 -1 1 1 -1 -1 1 1 -1 1 1 1
  [4,16,1,-1,1,1,-1,-1,1,1,-1,1,1,1],
// 0
];
module ldraw_lib__box(step=0, col=false, unit=2/5, alt=false, line=0.2, solid=!$preview)
    makepoly(ldraw_lib__box(), step=step, col=col, unit=unit, alt=alt, line=line, solid=solid);
ldraw_lib__box(line=0.2);
// main file
use <../lib.scad>
use <../p/box.scad>
use <s/u9626s01.scad>
function ldraw_lib__u9626() = [
// 0 ~Electric Technic Motor Connector
// 0 Name: u9626.dat
// 0 Author: Rene Rechthaler [Blechtaler]
// 0 !LDRAW_ORG Part UPDATE 2024-08
// 0 !LICENSE Licensed under CC BY 4.0 : see CAreadme.txt
// 
// 0 BFC CERTIFY CCW
  [0,"BFC","CERTIFY"],
  [0,"BFC","CCW"],
// 
// 0 !HISTORY 2024-09-30 [OrionP] Official Update 2024-08
// 
// 0 // Vision blocker
// 1 16 0 26 39 16 0 0 0 7 0 0 0 1 box.dat
  [1,16,0,26,39,16,0,0,0,7,0,0,0,1, ldraw_lib__box()],
// 
// 0 // Contacts
// 1 494 0 0 0 1 0 0 0 1 0 0 0 1 s\u9626s01.dat
  [1,494,0,0,0,1,0,0,0,1,0,0,0,1, ldraw_lib__s__u9626s01()],
// 1 494 0 0 0 -1 0 0 0 1 0 0 0 1 s\u9626s01.dat
  [1,494,0,0,0,-1,0,0,0,1,0,0,0,1, ldraw_lib__s__u9626s01()],
// 
// 0 // Contacts as flat boxes
// 0 // 1 494 13.75 26 40 .25 0 0 0 0 7 0 16 0 box5.dat
// 0 // 1 494 6.25 26 40 .25 0 0 0 0 7 0 16 0 box5.dat
// 0 // 1 494 -6.25 26 40 .25 0 0 0 0 7 0 16 0 box5.dat
// 0 // 1 494 -13.75 26 40 .25 0 0 0 0 7 0 16 0 box5.dat
];
module ldraw_lib__u9626(step=0, col=false, unit=2/5, alt=false, line=0.2, solid=!$preview)
    makepoly(ldraw_lib__u9626(), step=step, col=col, unit=unit, alt=alt, line=line, solid=solid);
ldraw_lib__u9626(line=0.2);
